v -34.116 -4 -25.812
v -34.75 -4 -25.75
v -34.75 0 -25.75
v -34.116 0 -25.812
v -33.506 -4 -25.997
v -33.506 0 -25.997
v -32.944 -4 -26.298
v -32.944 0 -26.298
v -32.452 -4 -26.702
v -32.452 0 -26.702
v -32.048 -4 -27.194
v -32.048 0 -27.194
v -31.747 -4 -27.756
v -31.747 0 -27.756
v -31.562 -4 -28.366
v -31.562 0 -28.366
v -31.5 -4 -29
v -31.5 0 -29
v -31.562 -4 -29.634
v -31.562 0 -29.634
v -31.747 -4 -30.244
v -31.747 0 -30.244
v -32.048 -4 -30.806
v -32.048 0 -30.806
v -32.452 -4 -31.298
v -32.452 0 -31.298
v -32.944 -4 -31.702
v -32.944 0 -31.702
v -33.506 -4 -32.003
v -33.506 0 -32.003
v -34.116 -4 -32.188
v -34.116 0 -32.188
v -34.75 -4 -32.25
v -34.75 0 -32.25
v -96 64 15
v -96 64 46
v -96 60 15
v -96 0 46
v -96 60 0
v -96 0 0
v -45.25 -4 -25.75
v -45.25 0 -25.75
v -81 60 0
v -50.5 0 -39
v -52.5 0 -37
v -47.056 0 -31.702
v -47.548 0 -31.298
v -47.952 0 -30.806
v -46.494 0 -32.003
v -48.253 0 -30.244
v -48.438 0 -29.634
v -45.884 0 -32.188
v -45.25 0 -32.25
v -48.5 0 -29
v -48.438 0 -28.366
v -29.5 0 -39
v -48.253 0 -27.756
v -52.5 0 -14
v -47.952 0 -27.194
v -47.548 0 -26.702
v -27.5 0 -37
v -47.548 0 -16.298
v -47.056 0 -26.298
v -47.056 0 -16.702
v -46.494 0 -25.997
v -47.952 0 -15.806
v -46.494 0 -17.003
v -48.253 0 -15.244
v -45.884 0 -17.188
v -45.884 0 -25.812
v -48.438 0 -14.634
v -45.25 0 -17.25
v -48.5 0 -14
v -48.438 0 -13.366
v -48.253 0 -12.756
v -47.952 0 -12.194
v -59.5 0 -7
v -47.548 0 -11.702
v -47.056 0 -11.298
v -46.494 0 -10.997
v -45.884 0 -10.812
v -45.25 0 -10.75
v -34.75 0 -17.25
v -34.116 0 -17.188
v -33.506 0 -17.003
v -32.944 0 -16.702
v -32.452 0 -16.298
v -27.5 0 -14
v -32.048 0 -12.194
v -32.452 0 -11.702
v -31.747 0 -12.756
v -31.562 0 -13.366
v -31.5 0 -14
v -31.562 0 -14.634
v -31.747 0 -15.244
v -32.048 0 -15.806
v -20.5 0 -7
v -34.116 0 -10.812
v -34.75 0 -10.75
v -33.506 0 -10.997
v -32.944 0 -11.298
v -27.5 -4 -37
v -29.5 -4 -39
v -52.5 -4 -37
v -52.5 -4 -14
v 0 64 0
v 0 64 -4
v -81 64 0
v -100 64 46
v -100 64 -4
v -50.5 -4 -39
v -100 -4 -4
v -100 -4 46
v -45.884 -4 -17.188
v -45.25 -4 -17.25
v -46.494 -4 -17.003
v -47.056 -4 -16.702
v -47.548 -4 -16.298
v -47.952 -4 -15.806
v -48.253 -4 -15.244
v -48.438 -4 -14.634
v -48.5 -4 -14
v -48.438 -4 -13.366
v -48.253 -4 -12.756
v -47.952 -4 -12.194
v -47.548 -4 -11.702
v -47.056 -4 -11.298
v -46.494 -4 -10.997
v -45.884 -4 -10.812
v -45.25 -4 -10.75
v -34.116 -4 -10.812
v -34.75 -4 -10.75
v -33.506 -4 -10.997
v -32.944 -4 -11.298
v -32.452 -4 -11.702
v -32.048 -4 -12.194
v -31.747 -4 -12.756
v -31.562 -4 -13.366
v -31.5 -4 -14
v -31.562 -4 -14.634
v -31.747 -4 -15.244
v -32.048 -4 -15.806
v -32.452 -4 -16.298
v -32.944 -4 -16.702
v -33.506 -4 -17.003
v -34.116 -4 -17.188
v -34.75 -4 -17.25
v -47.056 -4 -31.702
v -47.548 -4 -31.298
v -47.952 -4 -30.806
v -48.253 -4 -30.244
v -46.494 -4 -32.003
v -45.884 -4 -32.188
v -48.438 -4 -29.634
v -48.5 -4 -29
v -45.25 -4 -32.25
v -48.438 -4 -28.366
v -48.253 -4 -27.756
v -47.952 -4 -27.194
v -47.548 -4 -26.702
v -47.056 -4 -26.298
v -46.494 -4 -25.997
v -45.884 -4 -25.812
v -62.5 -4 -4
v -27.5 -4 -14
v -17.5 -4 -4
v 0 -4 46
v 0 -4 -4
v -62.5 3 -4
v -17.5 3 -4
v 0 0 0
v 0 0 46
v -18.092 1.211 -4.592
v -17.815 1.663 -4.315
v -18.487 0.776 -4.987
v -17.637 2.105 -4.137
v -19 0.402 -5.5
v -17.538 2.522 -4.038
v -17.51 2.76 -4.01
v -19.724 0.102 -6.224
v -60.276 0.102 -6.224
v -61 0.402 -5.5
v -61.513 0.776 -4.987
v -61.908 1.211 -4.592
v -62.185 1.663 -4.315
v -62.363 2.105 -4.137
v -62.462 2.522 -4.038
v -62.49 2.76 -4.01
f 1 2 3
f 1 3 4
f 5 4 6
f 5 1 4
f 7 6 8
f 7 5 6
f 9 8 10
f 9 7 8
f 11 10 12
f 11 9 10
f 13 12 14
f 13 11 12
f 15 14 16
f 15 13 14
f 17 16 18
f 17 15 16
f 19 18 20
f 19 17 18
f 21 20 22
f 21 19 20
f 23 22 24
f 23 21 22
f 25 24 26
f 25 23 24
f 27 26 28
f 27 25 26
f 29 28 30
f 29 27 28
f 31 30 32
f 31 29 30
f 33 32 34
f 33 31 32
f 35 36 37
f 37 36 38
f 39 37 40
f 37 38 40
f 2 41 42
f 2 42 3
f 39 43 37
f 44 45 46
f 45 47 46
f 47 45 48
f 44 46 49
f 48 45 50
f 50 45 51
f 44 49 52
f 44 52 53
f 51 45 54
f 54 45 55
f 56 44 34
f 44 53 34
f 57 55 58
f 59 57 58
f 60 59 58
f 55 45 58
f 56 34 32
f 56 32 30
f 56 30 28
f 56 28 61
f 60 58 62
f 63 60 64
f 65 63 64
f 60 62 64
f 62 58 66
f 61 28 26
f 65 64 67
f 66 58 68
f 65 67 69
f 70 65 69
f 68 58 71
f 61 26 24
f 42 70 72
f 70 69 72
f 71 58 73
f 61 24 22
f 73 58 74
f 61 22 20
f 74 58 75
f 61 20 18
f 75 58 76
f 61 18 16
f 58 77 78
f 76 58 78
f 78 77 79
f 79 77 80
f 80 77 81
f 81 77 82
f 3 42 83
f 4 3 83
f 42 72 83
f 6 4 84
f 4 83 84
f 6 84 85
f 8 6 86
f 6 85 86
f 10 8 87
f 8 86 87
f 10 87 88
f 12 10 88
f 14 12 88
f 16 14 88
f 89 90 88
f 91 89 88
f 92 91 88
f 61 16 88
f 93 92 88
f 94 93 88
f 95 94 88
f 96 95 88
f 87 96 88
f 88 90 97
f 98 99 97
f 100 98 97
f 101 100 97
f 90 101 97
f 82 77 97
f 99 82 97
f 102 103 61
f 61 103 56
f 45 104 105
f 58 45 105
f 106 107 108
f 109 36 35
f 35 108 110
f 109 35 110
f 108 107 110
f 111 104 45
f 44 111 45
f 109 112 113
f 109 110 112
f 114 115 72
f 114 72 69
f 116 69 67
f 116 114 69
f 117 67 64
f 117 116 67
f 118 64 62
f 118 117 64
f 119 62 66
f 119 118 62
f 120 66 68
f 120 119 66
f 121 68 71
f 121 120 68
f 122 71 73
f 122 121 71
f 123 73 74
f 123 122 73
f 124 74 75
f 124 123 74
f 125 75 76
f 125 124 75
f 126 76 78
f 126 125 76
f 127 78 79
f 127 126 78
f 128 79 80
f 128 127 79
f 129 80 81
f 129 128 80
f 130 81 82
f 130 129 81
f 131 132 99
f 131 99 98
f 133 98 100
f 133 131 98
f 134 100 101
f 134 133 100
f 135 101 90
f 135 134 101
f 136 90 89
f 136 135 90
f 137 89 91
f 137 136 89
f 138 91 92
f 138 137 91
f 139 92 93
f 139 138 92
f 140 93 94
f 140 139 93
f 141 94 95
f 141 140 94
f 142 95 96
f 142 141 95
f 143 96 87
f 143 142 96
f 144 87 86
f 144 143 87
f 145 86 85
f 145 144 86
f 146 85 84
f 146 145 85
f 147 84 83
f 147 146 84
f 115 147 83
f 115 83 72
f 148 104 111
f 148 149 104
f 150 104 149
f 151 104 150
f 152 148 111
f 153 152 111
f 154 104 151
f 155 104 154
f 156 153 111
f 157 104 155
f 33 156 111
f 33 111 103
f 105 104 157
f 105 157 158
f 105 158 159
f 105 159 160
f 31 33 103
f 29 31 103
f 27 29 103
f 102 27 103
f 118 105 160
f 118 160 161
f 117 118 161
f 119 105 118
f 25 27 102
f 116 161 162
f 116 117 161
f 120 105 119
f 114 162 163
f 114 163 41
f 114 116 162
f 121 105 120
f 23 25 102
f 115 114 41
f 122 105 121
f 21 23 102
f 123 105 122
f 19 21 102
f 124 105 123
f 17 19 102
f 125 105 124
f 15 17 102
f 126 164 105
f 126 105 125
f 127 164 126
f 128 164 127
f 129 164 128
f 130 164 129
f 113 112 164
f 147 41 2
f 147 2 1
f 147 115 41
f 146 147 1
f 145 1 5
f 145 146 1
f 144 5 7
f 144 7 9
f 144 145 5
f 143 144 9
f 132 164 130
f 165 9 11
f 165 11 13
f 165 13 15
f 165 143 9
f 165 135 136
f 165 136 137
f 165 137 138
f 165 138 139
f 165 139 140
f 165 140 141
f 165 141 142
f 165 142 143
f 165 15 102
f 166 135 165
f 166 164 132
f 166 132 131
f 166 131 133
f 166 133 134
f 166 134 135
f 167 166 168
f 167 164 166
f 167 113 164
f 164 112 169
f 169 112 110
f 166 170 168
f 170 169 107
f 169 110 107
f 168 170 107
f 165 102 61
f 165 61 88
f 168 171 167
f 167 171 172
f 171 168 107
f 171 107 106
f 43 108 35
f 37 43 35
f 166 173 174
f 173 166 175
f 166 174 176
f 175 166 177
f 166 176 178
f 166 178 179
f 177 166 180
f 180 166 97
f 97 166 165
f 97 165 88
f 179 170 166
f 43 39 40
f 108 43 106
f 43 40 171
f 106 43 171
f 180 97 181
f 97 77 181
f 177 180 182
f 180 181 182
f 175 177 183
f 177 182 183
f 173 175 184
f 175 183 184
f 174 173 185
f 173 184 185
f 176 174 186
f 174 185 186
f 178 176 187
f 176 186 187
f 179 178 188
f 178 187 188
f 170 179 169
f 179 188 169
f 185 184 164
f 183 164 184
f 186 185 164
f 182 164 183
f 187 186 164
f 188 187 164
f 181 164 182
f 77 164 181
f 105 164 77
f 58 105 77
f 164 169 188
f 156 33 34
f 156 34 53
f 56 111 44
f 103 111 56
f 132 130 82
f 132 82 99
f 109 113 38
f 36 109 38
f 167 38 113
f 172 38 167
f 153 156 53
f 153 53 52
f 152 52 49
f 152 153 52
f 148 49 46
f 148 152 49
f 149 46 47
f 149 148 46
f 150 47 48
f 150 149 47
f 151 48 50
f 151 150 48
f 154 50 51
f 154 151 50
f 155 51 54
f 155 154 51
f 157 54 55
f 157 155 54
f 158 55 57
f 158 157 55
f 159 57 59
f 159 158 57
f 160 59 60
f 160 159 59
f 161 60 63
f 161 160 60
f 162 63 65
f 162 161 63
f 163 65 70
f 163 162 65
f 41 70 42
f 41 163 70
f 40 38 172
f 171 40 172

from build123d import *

# Parameters (mm, degrees)
BOSS_EXTRUDE1_DEPTH       = 64
SKETCH2_W                 = 100
SKETCH2_H                 = 50
BOSS_EXTRUDE2_DEPTH       = 4
BOSS_EXTRUDE3_DEPTH       = 4
SKETCH4_W                 = 25
SKETCH4_H                 = 35
BOSS_EXTRUDE4_DEPTH       = 4
F_6_0MM_START             = -4
F_6_0MM_DOWEL_SLOT1_DEPTH = 4
CHAMFER1_SIZE             = 10
CHAMFER2_SIZE             = 2
FILLET1_R                 = 3


# Read off the part's stored shape, not the designer's step: Ø6.0mm Dowel Slot1
with BuildPart() as part:
    # Sketch1 → Boss-Extrude1 (new body)
    with BuildSketch(Plane(origin=(0, 0, 0), x_dir=(1, 0, 0), z_dir=(0, 1, 0))):
        Polygon((0, 0), (0, 4), (-100, 4), (-100, -46), (-96, -46), (-96, 0), align=None)
    extrude(amount=BOSS_EXTRUDE1_DEPTH)

    # Sketch2 → Boss-Extrude2 (add)
    with BuildSketch(Plane.XZ):
        with Locations((-50, 21)):
            Rectangle(SKETCH2_W, SKETCH2_H)
    extrude(amount=BOSS_EXTRUDE2_DEPTH)

    # Sketch3 → Boss-Extrude3 (add)
    with BuildSketch(Plane(origin=(0, 64, 0), x_dir=(1, 0, 0), z_dir=(0, 1, 0))):
        Polygon((-96, 0), (-81, 0), (-96, -15), align=None)
    extrude(amount=-BOSS_EXTRUDE3_DEPTH)

    # Sketch4 → Boss-Extrude4 (add)
    with BuildSketch(Plane.XZ.offset(4)):
        with Locations((-40, -21.5)):
            Rectangle(SKETCH4_W, SKETCH4_H)
    extrude(amount=-BOSS_EXTRUDE4_DEPTH)

    # Ø6.0mm Dowel Slot1 outline → Ø6.0mm Dowel Slot1 (cut)
    with BuildSketch(Plane(origin=(0, 0, 0), x_dir=(1, 0, 0), z_dir=(0, 1, 0)).offset(F_6_0MM_START)):
        with BuildLine():
            Line((-45.25, 10.75), (-34.75, 10.75))
            ThreePointArc((-34.75, 10.75), (-31.5, 14), (-34.75, 17.25))
            Line((-34.75, 17.25), (-45.25, 17.25))
            ThreePointArc((-45.25, 17.25), (-48.5, 14), (-45.25, 10.75))
        make_face()
        with BuildLine():
            Line((-45.25, 25.75), (-34.75, 25.75))
            ThreePointArc((-34.75, 25.75), (-31.5, 29), (-34.75, 32.25))
            Line((-34.75, 32.25), (-45.25, 32.25))
            ThreePointArc((-45.25, 32.25), (-48.5, 29), (-45.25, 25.75))
        make_face()
    extrude(amount=F_6_0MM_DOWEL_SLOT1_DEPTH, mode=Mode.SUBTRACT)

    # Chamfer1
    chamfer1_edges = [part.edges().sort_by_distance(p)[0] for p in [
        (-52.5, -2, -4),
        (-27.5, -2, -4),
    ]]
    chamfer(chamfer1_edges, length=CHAMFER1_SIZE)

    # Chamfer2
    chamfer2_edges = [part.edges().sort_by_distance(p)[0] for p in [
        (-52.5, -2, -39),
        (-27.5, -2, -39),
    ]]
    chamfer(chamfer2_edges, length=CHAMFER2_SIZE)

    # Fillet1
    fillet1_edges = [part.edges().sort_by_distance(p)[0] for p in [
        (-40, 0, -4),
    ]]
    fillet(fillet1_edges, radius=FILLET1_R)


solid = part.part
